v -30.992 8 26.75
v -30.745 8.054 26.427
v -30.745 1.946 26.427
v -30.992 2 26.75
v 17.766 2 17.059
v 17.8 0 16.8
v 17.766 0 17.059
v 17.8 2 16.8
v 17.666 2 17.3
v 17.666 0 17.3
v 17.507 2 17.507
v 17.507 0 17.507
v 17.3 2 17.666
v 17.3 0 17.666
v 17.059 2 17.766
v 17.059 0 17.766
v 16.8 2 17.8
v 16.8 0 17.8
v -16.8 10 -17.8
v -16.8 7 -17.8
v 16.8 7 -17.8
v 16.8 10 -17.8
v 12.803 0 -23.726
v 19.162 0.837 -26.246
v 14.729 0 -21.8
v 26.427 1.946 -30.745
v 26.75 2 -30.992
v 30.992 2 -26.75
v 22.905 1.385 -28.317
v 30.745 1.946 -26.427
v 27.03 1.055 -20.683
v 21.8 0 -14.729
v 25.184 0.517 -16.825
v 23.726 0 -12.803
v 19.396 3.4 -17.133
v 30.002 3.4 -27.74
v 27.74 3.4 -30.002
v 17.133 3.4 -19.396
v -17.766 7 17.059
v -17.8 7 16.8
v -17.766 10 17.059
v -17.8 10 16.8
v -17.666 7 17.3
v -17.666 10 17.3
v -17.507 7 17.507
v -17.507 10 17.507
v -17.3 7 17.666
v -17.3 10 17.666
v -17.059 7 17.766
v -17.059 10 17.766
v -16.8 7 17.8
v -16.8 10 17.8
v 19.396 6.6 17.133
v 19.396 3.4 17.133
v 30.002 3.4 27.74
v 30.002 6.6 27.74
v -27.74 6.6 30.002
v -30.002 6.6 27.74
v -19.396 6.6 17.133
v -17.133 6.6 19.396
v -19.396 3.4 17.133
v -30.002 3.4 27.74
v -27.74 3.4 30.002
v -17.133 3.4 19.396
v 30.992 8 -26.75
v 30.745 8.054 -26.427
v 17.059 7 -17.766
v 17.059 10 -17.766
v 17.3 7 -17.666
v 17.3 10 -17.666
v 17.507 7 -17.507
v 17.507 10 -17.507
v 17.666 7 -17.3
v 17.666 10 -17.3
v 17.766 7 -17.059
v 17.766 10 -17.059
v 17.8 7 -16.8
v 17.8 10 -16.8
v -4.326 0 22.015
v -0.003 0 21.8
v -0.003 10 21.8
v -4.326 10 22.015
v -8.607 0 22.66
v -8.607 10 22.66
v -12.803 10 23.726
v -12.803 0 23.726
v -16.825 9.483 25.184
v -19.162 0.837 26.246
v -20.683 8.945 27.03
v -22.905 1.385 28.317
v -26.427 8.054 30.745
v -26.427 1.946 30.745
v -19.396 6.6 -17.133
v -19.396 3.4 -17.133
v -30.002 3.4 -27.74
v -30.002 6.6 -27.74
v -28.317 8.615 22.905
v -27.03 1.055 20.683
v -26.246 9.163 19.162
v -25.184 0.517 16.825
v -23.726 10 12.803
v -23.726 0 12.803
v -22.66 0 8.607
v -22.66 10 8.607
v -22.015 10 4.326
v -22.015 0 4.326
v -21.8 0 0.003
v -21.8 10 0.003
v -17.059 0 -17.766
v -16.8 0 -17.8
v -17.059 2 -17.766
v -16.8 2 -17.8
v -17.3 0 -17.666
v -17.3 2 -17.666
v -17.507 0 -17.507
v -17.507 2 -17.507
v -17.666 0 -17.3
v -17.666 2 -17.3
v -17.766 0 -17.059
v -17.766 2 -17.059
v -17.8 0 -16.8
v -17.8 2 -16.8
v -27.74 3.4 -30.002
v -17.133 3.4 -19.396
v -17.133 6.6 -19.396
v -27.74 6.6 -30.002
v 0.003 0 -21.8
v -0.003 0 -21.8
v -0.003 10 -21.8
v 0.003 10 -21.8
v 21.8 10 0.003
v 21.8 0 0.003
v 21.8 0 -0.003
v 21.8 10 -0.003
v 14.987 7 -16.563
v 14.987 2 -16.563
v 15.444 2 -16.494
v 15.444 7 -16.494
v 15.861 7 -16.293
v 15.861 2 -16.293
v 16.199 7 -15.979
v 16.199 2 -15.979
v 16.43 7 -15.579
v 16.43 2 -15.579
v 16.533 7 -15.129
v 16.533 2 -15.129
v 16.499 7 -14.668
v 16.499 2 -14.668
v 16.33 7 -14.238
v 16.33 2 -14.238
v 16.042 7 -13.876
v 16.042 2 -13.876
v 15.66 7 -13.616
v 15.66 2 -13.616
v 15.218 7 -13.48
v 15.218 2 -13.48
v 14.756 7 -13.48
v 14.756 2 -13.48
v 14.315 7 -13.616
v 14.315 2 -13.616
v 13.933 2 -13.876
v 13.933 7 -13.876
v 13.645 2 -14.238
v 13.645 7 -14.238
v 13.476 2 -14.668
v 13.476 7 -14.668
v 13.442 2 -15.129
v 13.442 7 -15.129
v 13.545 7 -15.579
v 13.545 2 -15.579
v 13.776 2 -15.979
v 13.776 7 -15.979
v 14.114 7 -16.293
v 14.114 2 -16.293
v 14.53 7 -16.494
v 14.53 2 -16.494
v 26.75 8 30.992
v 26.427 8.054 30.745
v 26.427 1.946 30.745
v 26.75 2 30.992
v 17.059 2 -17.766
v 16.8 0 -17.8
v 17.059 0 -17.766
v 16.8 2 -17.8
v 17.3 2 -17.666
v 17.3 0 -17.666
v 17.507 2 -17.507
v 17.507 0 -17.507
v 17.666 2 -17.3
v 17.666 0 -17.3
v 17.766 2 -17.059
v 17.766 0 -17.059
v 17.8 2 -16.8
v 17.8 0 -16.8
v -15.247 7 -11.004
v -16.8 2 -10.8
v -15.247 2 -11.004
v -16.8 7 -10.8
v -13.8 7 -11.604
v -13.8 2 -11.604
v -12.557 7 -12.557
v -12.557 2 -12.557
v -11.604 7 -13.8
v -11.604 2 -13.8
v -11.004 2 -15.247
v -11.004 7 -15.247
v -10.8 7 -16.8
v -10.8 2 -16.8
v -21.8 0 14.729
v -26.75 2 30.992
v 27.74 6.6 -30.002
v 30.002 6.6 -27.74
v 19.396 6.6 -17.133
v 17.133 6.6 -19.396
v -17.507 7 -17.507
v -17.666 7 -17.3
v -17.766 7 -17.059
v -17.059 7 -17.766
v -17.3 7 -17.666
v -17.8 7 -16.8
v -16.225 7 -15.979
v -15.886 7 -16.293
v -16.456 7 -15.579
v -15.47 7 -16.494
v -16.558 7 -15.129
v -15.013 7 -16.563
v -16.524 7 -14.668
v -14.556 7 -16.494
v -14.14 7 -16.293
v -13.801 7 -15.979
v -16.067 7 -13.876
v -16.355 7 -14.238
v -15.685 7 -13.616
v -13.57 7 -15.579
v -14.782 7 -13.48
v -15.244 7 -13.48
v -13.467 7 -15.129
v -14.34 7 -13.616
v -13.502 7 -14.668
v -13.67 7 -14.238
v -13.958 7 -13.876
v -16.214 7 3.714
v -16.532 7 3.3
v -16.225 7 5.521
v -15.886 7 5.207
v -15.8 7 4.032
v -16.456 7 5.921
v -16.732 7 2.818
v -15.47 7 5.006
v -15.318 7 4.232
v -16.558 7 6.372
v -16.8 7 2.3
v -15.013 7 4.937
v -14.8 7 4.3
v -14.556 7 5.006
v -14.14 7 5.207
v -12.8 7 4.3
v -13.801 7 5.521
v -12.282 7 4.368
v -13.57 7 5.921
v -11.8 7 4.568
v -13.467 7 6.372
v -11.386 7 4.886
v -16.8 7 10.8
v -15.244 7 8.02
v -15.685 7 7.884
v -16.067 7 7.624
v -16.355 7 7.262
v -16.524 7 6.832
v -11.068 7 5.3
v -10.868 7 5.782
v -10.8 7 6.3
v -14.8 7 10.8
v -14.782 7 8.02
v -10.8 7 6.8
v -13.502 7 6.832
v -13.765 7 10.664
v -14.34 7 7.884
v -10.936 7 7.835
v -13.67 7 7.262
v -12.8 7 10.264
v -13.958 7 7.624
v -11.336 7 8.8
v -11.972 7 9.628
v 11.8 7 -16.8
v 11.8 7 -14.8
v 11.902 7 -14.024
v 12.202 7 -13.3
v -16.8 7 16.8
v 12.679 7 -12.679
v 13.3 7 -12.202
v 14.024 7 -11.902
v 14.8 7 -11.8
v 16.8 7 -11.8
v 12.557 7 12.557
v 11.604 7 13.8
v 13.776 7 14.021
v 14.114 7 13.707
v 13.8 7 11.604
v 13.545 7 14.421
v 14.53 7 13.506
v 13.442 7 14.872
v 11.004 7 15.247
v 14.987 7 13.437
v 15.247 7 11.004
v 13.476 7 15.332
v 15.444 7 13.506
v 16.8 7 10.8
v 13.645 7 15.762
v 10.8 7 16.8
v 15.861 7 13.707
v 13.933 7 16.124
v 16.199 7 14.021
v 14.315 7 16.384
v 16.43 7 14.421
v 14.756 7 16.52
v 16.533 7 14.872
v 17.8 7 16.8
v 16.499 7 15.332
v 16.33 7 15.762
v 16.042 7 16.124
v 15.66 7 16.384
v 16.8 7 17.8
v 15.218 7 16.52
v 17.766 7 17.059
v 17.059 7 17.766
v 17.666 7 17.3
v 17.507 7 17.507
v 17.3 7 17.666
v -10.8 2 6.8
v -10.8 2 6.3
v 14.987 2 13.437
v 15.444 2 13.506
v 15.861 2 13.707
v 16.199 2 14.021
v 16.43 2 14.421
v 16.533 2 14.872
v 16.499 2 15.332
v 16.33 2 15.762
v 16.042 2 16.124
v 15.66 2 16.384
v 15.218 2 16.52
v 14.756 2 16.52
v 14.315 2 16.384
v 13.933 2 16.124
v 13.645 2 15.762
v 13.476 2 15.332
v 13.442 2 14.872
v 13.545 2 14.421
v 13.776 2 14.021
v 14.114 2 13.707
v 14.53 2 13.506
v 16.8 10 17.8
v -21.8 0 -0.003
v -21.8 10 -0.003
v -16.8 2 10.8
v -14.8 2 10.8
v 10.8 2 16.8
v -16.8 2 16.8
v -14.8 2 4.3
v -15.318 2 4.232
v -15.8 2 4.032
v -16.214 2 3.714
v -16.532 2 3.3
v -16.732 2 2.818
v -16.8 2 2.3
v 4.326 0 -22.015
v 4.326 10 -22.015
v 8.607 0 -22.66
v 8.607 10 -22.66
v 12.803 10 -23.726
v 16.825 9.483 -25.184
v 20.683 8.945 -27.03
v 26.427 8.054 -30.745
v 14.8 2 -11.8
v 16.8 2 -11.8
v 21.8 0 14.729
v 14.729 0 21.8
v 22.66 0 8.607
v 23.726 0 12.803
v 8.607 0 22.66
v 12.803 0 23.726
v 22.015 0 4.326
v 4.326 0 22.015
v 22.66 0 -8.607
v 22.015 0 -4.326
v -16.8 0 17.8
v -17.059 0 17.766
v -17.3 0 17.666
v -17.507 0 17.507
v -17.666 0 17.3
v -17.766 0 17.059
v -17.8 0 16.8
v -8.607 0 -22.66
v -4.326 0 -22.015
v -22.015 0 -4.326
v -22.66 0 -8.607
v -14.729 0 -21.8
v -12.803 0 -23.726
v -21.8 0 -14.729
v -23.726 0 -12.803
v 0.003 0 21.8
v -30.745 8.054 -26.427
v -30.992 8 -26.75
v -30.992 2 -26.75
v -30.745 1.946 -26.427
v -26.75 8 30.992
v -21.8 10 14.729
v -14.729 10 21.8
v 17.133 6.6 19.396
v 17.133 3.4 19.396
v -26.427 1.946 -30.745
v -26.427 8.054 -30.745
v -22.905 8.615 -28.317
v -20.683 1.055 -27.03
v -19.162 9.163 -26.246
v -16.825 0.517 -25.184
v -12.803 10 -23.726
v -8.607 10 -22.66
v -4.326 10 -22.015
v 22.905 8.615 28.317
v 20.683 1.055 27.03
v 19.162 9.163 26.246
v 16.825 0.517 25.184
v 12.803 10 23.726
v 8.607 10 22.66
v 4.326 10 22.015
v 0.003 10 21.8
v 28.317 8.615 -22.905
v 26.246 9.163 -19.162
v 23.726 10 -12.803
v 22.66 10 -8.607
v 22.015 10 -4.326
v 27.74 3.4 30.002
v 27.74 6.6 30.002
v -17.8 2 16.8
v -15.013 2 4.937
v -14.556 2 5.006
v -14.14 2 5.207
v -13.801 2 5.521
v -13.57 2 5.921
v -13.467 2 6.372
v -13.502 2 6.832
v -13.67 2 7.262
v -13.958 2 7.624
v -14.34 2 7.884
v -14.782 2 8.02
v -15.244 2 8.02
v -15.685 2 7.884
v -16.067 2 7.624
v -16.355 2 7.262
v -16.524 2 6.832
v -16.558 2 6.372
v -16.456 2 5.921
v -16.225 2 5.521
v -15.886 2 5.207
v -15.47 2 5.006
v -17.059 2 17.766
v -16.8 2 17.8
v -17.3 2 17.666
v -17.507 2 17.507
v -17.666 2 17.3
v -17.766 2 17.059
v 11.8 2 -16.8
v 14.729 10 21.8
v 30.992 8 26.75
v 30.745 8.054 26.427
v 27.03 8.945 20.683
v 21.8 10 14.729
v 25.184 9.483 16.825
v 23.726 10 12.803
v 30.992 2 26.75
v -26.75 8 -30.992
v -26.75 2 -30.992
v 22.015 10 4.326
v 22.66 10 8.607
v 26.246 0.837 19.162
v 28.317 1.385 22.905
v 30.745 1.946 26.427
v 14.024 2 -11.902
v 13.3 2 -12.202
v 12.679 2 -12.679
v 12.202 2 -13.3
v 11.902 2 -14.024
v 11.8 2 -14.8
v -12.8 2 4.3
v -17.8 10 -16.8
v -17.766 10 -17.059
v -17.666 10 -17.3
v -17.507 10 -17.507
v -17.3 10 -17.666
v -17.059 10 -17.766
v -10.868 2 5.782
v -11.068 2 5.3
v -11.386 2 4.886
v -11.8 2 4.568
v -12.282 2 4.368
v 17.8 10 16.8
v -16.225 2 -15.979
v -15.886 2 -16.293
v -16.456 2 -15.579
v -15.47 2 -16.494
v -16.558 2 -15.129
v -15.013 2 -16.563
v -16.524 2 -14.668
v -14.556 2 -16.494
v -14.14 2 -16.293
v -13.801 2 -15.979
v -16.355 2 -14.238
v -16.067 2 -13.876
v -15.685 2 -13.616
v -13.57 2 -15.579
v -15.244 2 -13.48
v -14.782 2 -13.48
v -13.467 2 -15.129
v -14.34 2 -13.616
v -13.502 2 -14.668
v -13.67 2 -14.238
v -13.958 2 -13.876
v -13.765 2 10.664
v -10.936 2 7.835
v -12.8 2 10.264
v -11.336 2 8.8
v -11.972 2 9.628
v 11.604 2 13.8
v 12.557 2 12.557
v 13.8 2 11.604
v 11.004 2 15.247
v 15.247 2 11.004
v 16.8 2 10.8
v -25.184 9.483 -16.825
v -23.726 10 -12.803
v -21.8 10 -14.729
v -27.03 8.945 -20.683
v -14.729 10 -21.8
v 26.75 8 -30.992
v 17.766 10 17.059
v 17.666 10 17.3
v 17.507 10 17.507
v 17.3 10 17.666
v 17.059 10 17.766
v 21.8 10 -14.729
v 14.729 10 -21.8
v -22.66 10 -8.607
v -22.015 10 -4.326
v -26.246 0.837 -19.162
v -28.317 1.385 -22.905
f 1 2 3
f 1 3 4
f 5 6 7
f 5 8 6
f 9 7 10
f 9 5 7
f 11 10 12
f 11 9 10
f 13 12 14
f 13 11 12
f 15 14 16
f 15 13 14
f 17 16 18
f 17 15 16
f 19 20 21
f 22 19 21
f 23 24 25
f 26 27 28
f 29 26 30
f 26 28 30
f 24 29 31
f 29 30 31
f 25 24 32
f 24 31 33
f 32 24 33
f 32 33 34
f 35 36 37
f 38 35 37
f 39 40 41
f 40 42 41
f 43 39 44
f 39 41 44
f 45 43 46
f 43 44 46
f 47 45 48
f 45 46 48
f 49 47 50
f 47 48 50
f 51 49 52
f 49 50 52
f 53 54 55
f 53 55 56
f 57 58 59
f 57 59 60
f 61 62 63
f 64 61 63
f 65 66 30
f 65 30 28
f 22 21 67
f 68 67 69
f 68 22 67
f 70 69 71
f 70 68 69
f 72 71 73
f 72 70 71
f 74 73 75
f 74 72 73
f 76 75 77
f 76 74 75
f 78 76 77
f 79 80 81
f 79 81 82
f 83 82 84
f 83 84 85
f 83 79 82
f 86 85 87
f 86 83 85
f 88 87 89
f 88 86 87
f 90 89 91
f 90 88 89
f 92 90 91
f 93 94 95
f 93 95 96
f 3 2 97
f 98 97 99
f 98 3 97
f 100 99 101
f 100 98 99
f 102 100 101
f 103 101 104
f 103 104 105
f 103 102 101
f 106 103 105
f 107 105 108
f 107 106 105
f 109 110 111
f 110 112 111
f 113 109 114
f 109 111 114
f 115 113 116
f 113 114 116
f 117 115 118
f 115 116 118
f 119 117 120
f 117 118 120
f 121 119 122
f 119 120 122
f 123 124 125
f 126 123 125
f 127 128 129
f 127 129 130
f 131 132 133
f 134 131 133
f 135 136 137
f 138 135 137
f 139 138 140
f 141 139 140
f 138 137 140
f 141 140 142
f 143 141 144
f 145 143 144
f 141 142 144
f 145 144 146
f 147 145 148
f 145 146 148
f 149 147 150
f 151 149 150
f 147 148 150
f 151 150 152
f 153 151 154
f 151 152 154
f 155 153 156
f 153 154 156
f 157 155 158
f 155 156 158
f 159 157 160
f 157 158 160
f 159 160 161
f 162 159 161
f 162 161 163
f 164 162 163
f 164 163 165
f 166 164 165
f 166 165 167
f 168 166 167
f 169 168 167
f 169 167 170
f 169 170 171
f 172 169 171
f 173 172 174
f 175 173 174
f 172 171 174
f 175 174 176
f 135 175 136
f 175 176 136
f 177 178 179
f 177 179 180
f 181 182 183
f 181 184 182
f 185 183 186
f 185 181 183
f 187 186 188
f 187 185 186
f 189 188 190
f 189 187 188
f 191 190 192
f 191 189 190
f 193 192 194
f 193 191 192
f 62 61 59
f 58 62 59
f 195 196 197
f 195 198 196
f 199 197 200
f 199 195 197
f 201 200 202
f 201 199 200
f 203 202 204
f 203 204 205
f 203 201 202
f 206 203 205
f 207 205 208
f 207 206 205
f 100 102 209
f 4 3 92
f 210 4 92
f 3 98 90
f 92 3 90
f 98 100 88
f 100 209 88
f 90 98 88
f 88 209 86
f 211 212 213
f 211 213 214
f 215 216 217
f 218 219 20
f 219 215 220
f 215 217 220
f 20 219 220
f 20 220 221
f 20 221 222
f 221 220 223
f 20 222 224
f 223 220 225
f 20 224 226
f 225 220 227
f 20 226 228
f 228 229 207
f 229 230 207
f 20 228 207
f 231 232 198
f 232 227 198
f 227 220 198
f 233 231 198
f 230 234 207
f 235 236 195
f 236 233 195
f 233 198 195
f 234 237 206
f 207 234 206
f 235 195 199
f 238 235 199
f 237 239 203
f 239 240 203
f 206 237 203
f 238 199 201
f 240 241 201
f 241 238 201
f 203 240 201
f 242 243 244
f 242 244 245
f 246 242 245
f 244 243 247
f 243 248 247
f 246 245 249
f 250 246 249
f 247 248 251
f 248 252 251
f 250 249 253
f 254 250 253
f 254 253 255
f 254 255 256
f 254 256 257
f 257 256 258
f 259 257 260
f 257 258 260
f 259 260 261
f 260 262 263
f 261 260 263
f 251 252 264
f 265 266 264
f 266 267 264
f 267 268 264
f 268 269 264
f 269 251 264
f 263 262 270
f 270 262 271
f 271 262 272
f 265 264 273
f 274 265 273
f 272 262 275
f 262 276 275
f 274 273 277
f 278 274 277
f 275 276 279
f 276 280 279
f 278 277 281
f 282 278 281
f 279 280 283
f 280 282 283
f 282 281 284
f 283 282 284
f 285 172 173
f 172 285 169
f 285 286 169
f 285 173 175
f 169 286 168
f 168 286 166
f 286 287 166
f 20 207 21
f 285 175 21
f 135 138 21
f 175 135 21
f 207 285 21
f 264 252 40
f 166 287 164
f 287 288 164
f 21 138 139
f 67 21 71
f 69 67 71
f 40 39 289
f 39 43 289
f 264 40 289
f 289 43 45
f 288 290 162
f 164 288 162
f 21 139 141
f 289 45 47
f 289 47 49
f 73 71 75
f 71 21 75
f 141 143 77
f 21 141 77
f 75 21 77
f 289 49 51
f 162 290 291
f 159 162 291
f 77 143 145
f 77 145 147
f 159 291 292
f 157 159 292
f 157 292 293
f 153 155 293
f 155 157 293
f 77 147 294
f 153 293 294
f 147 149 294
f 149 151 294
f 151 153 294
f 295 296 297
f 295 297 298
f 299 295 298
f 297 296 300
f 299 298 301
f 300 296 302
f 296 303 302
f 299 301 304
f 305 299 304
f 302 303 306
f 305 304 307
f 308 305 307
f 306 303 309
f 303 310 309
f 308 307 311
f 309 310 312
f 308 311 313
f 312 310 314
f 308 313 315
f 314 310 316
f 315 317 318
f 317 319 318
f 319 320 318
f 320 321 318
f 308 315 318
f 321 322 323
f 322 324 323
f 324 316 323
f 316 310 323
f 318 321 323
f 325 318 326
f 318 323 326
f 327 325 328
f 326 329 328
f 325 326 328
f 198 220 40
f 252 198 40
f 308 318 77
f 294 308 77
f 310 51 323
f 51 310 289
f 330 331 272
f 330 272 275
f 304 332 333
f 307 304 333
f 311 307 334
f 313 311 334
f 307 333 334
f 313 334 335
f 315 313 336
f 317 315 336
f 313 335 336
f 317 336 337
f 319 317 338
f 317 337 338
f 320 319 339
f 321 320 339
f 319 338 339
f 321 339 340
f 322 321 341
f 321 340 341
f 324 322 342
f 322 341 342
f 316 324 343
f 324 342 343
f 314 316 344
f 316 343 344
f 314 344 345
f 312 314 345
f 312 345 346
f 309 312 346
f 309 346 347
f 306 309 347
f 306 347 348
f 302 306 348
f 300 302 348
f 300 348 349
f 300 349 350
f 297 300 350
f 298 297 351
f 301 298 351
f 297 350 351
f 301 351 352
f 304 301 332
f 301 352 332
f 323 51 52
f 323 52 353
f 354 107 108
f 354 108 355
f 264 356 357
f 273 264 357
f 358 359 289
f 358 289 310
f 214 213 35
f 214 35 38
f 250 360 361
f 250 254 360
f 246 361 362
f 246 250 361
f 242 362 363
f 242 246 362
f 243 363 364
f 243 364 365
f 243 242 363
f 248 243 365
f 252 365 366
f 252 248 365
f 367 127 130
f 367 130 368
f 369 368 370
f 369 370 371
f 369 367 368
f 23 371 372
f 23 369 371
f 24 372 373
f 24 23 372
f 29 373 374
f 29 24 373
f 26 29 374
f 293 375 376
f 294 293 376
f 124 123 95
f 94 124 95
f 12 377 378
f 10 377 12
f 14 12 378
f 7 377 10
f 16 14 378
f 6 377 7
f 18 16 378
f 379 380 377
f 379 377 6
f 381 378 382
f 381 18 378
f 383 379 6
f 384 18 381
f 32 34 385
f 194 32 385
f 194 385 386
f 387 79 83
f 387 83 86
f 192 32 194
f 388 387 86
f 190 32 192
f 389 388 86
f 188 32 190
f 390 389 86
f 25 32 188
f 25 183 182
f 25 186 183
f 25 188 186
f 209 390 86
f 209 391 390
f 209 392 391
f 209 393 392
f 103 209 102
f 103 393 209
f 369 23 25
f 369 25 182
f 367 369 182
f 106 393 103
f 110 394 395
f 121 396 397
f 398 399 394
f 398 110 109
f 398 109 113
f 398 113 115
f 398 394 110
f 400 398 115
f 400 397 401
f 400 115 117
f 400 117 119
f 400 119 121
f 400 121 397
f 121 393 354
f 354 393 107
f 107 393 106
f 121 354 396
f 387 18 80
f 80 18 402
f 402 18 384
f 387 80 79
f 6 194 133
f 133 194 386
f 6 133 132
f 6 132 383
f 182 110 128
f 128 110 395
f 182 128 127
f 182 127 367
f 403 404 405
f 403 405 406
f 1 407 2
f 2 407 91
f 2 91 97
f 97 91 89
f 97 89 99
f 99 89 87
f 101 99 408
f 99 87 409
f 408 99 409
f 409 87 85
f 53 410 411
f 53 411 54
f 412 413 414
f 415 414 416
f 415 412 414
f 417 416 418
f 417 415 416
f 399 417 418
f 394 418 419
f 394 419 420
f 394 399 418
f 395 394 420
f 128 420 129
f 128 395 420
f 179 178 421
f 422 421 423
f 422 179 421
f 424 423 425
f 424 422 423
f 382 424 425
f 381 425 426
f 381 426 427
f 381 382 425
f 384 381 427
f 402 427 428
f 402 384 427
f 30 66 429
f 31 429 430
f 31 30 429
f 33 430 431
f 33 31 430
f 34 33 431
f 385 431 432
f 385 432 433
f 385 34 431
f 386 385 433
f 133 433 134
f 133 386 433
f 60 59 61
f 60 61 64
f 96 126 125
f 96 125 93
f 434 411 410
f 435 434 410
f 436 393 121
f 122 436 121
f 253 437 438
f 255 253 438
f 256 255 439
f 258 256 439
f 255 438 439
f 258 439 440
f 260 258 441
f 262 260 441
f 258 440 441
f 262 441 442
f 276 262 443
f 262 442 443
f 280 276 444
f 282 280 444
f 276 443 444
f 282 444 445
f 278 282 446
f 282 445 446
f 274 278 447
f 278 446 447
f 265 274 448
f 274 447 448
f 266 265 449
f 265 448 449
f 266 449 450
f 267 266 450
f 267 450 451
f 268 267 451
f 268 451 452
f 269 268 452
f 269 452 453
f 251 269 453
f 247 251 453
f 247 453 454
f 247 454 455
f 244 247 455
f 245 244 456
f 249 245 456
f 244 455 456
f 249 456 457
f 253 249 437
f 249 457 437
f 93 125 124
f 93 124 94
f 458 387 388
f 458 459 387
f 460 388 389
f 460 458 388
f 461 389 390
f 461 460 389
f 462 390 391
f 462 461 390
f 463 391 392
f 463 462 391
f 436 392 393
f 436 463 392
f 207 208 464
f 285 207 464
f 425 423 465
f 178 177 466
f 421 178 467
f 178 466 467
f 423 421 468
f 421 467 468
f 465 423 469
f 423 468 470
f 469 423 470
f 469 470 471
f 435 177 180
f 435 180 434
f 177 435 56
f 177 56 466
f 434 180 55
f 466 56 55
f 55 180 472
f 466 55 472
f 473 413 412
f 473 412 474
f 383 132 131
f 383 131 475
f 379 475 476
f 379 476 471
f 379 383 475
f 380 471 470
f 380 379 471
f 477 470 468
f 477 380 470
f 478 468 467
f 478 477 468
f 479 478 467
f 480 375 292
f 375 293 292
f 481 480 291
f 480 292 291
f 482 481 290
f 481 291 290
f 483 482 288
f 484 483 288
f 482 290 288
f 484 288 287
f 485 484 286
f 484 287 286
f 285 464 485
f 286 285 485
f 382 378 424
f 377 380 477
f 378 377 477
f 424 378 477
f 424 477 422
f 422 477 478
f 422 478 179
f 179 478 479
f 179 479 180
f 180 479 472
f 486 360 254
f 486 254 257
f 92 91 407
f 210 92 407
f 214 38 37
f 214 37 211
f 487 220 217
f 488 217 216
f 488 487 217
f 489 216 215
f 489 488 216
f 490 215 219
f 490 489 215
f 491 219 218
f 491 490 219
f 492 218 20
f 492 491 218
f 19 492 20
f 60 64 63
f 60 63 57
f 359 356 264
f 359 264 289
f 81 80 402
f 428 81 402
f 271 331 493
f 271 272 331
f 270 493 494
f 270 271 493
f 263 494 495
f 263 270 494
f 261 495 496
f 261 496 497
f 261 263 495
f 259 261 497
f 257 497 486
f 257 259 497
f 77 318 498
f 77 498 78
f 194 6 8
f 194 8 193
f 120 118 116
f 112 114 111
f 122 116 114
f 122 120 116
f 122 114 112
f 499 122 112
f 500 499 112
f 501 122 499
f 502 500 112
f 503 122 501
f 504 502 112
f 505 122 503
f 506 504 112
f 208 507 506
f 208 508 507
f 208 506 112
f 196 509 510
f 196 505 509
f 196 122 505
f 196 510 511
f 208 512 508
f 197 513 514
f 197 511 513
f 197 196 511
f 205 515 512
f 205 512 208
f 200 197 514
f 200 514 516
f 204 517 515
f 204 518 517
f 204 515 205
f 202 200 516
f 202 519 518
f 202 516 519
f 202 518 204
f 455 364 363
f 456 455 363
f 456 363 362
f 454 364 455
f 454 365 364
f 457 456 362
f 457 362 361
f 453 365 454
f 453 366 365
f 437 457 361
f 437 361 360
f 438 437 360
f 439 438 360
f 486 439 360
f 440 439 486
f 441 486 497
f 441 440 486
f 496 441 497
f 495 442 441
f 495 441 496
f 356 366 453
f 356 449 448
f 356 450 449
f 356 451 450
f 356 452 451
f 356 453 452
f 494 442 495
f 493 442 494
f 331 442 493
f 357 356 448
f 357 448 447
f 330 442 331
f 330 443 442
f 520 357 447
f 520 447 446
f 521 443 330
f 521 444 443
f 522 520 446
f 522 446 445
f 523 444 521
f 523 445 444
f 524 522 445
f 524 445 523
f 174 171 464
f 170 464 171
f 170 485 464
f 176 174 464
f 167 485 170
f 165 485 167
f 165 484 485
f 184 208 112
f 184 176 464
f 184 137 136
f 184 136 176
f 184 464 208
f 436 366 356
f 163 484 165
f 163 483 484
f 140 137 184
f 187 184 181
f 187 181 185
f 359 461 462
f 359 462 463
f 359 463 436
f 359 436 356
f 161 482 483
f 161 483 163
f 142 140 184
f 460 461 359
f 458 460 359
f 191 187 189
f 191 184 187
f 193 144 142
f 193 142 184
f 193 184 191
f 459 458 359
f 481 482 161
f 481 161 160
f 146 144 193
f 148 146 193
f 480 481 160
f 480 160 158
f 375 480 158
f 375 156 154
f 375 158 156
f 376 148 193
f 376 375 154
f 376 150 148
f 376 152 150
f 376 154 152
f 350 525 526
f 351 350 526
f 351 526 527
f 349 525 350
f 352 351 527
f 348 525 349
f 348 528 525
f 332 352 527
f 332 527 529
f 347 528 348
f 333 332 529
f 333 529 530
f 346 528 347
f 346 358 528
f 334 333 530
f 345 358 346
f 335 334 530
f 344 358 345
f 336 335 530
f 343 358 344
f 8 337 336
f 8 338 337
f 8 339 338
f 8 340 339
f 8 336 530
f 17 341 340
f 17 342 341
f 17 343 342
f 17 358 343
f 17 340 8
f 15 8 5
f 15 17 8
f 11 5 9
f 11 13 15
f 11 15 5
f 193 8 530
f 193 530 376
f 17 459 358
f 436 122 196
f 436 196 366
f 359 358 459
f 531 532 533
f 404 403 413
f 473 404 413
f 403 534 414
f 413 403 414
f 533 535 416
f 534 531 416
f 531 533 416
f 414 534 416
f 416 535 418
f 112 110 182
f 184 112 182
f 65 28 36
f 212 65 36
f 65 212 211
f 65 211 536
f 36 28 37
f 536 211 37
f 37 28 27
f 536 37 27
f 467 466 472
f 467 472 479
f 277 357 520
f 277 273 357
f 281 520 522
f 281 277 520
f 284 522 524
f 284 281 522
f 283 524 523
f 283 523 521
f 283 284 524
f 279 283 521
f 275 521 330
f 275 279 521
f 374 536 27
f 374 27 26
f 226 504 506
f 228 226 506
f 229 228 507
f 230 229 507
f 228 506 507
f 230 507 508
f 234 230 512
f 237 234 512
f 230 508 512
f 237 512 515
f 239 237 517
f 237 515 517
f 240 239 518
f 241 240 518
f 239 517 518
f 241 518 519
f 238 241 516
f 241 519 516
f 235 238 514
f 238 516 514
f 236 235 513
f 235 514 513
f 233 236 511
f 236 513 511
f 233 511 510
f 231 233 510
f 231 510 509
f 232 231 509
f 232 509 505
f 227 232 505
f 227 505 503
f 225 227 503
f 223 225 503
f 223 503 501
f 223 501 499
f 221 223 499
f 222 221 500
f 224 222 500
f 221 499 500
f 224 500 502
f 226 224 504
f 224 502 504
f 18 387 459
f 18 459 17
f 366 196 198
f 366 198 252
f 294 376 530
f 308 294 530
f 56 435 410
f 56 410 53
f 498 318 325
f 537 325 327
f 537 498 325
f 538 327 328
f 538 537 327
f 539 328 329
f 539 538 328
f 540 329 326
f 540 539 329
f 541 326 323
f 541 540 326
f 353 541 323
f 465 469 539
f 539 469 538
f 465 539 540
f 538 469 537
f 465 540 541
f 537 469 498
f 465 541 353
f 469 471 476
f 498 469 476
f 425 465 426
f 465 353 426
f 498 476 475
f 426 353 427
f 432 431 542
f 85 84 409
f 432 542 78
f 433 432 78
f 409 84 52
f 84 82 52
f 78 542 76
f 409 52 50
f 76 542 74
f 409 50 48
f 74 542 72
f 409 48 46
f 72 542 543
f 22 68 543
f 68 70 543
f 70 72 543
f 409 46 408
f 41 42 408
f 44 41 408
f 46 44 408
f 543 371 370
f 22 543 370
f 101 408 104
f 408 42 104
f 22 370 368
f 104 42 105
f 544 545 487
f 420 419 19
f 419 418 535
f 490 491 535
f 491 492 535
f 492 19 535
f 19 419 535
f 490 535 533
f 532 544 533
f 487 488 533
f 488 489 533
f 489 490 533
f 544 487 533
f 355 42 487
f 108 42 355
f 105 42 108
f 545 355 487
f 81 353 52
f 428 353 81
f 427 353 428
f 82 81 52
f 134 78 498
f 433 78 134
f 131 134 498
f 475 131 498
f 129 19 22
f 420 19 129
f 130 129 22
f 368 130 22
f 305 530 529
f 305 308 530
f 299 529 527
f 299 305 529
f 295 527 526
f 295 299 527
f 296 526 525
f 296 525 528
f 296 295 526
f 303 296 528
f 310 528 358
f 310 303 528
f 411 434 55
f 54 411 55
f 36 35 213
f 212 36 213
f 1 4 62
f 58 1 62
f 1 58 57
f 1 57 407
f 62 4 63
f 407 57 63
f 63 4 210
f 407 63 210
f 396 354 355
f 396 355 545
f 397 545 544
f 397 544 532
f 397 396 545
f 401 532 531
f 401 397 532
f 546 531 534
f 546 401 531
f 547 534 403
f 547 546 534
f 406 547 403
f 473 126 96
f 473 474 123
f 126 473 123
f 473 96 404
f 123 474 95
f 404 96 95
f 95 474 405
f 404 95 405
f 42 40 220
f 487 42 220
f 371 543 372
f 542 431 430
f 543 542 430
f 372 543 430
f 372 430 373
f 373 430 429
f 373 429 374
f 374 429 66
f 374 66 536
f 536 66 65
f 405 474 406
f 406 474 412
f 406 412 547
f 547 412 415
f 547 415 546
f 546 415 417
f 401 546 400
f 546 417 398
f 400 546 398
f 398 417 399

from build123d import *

# Parameters (mm, degrees)
ESQUISSE1_W                   = 43.6
ESQUISSE1_H                   = 43.6
ESQUISSE1_W_2                 = 35.6
ESQUISSE1_H_2                 = 35.6
BOSS_EXTRU_1_DEPTH            = 10
ESQUISSE2_W                   = 3.2
ESQUISSE2_H                   = 3.2
ENL_V_MAT_EXTRU_1_DEPTH       = 15
CHANFREIN1_SIZE               = 15
CHANFREIN1_SIZE_2             = 2
R_P_TITION_CIRCULAIRE10_COUNT = 4
BOSS_EXTRU_3_START            = -2
ESQUISSE6_W                   = 6
ESQUISSE6_H                   = 6.5
ESQUISSE6_R                   = 1.55
ESQUISSE6_H_2                 = 6
ESQUISSE6_W_2                 = 5
ESQUISSE6_H_3                 = 5
ESQUISSE6_W_3                 = 1
ESQUISSE6_H_4                 = 22.6
ESQUISSE6_H_5                 = 15.1
ESQUISSE6_W_4                 = 22.6
ESQUISSE6_H_6                 = 1
BOSS_EXTRU_3_DEPTH            = 5
CONG_1_R                      = 6
CONG_2_R                      = 3
CONG_3_R                      = 4
CONG_4_R                      = 2
CONG_8_R                      = 1
CONG_9_R                      = 43.5
CONG_10_R                     = 2


# Some blends are built 0.0001 mm under size
with BuildPart() as part:
    # Esquisse1 → Boss.-Extru.1 (new body)
    # profile 1 of 5: a face of its own
    with BuildSketch(Plane(origin=(0, 0, 0), x_dir=(1, 0, 0), z_dir=(0, 1, 0))):
        Rectangle(ESQUISSE1_W, ESQUISSE1_H)
        Rectangle(ESQUISSE1_W_2, ESQUISSE1_H_2, mode=Mode.SUBTRACT)
    # profile 2 of 5: a face of its own
    with BuildSketch(Plane(origin=(0, 0, 0), x_dir=(1, 0, 0), z_dir=(0, 1, 0))):
        Polygon((32.406601718, -25.335533906), (21.8, -14.728932188), (21.8, -21.8), (14.728932188, -21.8), (25.335533906, -32.406601718), align=None)
    # profile 3 of 5: a face of its own
    with BuildSketch(Plane(origin=(0, 0, 0), x_dir=(1, 0, 0), z_dir=(0, 1, 0))):
        Polygon((21.8, 21.8), (21.8, 14.728932188), (32.406601718, 25.335533906), (25.335533906, 32.406601718), (14.728932188, 21.8), align=None)
    # profile 4 of 5: a face of its own
    with BuildSketch(Plane(origin=(0, 0, 0), x_dir=(1, 0, 0), z_dir=(0, 1, 0))):
        Polygon((-21.8, 21.8), (-14.728932188, 21.8), (-25.335533906, 32.406601718), (-32.406601718, 25.335533906), (-21.8, 14.728932188), align=None)
    # profile 5 of 5: a face of its own
    with BuildSketch(Plane(origin=(0, 0, 0), x_dir=(1, 0, 0), z_dir=(0, 1, 0))):
        Polygon((-25.335533906, -32.406601718), (-14.728932188, -21.8), (-21.8, -21.8), (-21.8, -14.728932188), (-32.406601718, -25.335533906), align=None)
    extrude(amount=BOSS_EXTRU_1_DEPTH)

    # Esquisse2 → Enlèv. mat.-Extru.1 (cut)
    with BuildSketch(Plane(origin=(28.871067812, 0, 28.871067812), x_dir=(0.7071067811865475, 0, -0.7071067811865477), z_dir=(0.7071067811865477, 0, 0.7071067811865475))):
        with Locations((0, 5)):
            Rectangle(ESQUISSE2_W, ESQUISSE2_H)
    enl_v_mat_extru_1 = extrude(amount=-ENL_V_MAT_EXTRU_1_DEPTH, mode=Mode.SUBTRACT)

    # Chanfrein1
    # the kernel refuses this chamfer: 15, 2 mm, written as the material it takes off along each edge
    with BuildSketch(Plane(origin=(-2.232682747, 0, 59.974818371), x_dir=(-0.7070976396858032, -0.0050848698637449155, -0.7070976396858037), z_dir=(0.7071067811865478, 0, -0.7071067811865474)), Plane(origin=(59.974818371, 0, 2.232682747), x_dir=(-0.7070976396858033, -0.005084869863744911, 0.7070976396858037), z_dir=(-0.7071067811865477, 0, -0.7071067811865474)), Plane(origin=(2.232682747, 0, -59.974818371), x_dir=(0.7070976396858034, -0.005084869863744912, 0.7070976396858035), z_dir=(-0.7071067811865476, 0, 0.7071067811865476)), Plane(origin=(-59.974818371, 0, -2.232682747), x_dir=(0.7070976396858035, -0.005084869863744911, -0.7070976396858034), z_dir=(0.7071067811865476, 0, 0.7071067811865476))) as chanfrein1_piece_1:
        Polygon((CHANFREIN1_SIZE * 0.999987071966, CHANFREIN1_SIZE * 0.00508486986374), (-CHANFREIN1_SIZE_2 * 0.00508486986374, CHANFREIN1_SIZE_2 * 0.999987071966), (0, 0), align=None)
    extrude(amount=87.974691762, mode=Mode.SUBTRACT)
    with BuildSketch(Plane(origin=(-2.232682747, 10, 59.974818371), x_dir=(-0.7070976396858032, 0.005084869863744968, -0.7070976396858037), z_dir=(0.7071067811865478, 0, -0.7071067811865474)), Plane(origin=(59.974818371, 10, 2.232682747), x_dir=(-0.7070976396858033, 0.005084869863744967, 0.7070976396858037), z_dir=(-0.7071067811865477, 0, -0.7071067811865474)), Plane(origin=(2.232682747, 10, -59.974818371), x_dir=(0.7070976396858034, 0.005084869863744967, 0.7070976396858035), z_dir=(-0.7071067811865476, 0, 0.7071067811865476)), Plane(origin=(-59.974818371, 10, -2.232682747), x_dir=(0.7070976396858035, 0.005084869863744967, -0.7070976396858034), z_dir=(0.7071067811865476, 0, 0.7071067811865476))) as chanfrein1_piece_2:
        Polygon((CHANFREIN1_SIZE * 0.999987071966, -CHANFREIN1_SIZE * 0.00508486986374), (-CHANFREIN1_SIZE_2 * 0.00508486986374, -CHANFREIN1_SIZE_2 * 0.999987071966), (0, 0), align=None)
    extrude(amount=87.974691762, mode=Mode.SUBTRACT)
    with BuildSketch(Plane(origin=(25.335533906, -38.987345881, 32.406601718), x_dir=(-0.7106931856479084, 0, -0.7035020937236985), z_dir=(0, 1, 0))) as chanfrein1_piece_3_section:
        Polygon((CHANFREIN1_SIZE * 0.999987071966, -CHANFREIN1_SIZE * 0.00508486986374), (-CHANFREIN1_SIZE_2 * 0.00508486986374, -CHANFREIN1_SIZE_2 * 0.999987071966), (0, 0), align=None)
    chanfrein1_piece_3 = extrude(amount=87.974691762, mode=Mode.PRIVATE)
    chanfrein1_piece_3 = split(chanfrein1_piece_3, bisect_by=Plane(origin=(21.834036331, 5, 21.8), z_dir=(0, 0, 1)), keep=Keep.TOP, mode=Mode.PRIVATE)
    add(chanfrein1_piece_3, mode=Mode.SUBTRACT)
    with BuildSketch(Plane(origin=(32.406601718, -38.987345881, 25.335533906), x_dir=(-0.48538969413478916, 0, 0.8742979153742365), z_dir=(0, 1, 0))) as chanfrein1_piece_4_section:
        Polygon((CHANFREIN1_SIZE_2 * 0.961444328979, -CHANFREIN1_SIZE_2 * 0.274999640498), (-CHANFREIN1_SIZE * 0.274999640498, -CHANFREIN1_SIZE * 0.961444328979), (0, 0), align=None)
    chanfrein1_piece_4 = extrude(amount=87.974691762, mode=Mode.PRIVATE)
    chanfrein1_piece_4 = split(chanfrein1_piece_4, bisect_by=Plane(origin=(21.8, 5, 21.834036331), z_dir=(1, 0, 0)), keep=Keep.TOP, mode=Mode.PRIVATE)
    add(chanfrein1_piece_4, mode=Mode.SUBTRACT)
    with BuildSketch(Plane(origin=(32.406601718, -38.987345881, -25.335533906), x_dir=(-0.7035020937236987, 0, 0.7106931856479084), z_dir=(0, 1, 0))) as chanfrein1_piece_5_section:
        Polygon((CHANFREIN1_SIZE * 0.999987071966, -CHANFREIN1_SIZE * 0.00508486986374), (-CHANFREIN1_SIZE_2 * 0.00508486986374, -CHANFREIN1_SIZE_2 * 0.999987071966), (0, 0), align=None)
    chanfrein1_piece_5 = extrude(amount=87.974691762, mode=Mode.PRIVATE)
    chanfrein1_piece_5 = split(chanfrein1_piece_5, bisect_by=Plane(origin=(21.8, 5, -21.834036331), z_dir=(1, 0, 0)), keep=Keep.TOP, mode=Mode.PRIVATE)
    add(chanfrein1_piece_5, mode=Mode.SUBTRACT)
    with BuildSketch(Plane(origin=(25.335533906, -38.987345881, -32.406601718), x_dir=(0.874297915374238, 0, 0.48538969413478666), z_dir=(0, 1, 0))) as chanfrein1_piece_6_section:
        Polygon((CHANFREIN1_SIZE_2 * 0.961444328979, -CHANFREIN1_SIZE_2 * 0.274999640498), (-CHANFREIN1_SIZE * 0.274999640498, -CHANFREIN1_SIZE * 0.961444328979), (0, 0), align=None)
    chanfrein1_piece_6 = extrude(amount=87.974691762, mode=Mode.PRIVATE)
    chanfrein1_piece_6 = split(chanfrein1_piece_6, bisect_by=Plane(origin=(21.834036331, 5, -21.8), z_dir=(0, 0, -1)), keep=Keep.TOP, mode=Mode.PRIVATE)
    add(chanfrein1_piece_6, mode=Mode.SUBTRACT)
    with BuildSketch(Plane(origin=(-25.335533906, -38.987345881, -32.406601718), x_dir=(0.7106931856479084, 0, 0.7035020937236987), z_dir=(0, 1, 0))) as chanfrein1_piece_7_section:
        Polygon((CHANFREIN1_SIZE * 0.999987071966, -CHANFREIN1_SIZE * 0.00508486986375), (-CHANFREIN1_SIZE_2 * 0.00508486986374, -CHANFREIN1_SIZE_2 * 0.999987071966), (0, 0), align=None)
    chanfrein1_piece_7 = extrude(amount=87.974691762, mode=Mode.PRIVATE)
    chanfrein1_piece_7 = split(chanfrein1_piece_7, bisect_by=Plane(origin=(-21.834036331, 5, -21.8), z_dir=(0, 0, -1)), keep=Keep.TOP, mode=Mode.PRIVATE)
    add(chanfrein1_piece_7, mode=Mode.SUBTRACT)
    with BuildSketch(Plane(origin=(-32.406601718, -38.987345881, -25.335533906), x_dir=(0.48538969413478794, 0, -0.8742979153742373), z_dir=(0, 1, 0))) as chanfrein1_piece_8_section:
        Polygon((CHANFREIN1_SIZE_2 * 0.961444328979, -CHANFREIN1_SIZE_2 * 0.274999640498), (-CHANFREIN1_SIZE * 0.274999640498, -CHANFREIN1_SIZE * 0.961444328979), (0, 0), align=None)
    chanfrein1_piece_8 = extrude(amount=87.974691762, mode=Mode.PRIVATE)
    chanfrein1_piece_8 = split(chanfrein1_piece_8, bisect_by=Plane(origin=(-21.8, 5, -21.834036331), z_dir=(-1, 0, 0)), keep=Keep.TOP, mode=Mode.PRIVATE)
    add(chanfrein1_piece_8, mode=Mode.SUBTRACT)
    with BuildSketch(Plane(origin=(-32.406601718, -38.987345881, 25.335533906), x_dir=(0.7035020937236987, 0, -0.7106931856479084), z_dir=(0, 1, 0))) as chanfrein1_piece_9_section:
        Polygon((CHANFREIN1_SIZE * 0.999987071966, -CHANFREIN1_SIZE * 0.00508486986374), (-CHANFREIN1_SIZE_2 * 0.00508486986374, -CHANFREIN1_SIZE_2 * 0.999987071966), (0, 0), align=None)
    chanfrein1_piece_9 = extrude(amount=87.974691762, mode=Mode.PRIVATE)
    chanfrein1_piece_9 = split(chanfrein1_piece_9, bisect_by=Plane(origin=(-21.8, 5, 21.834036331), z_dir=(-1, 0, 0)), keep=Keep.TOP, mode=Mode.PRIVATE)
    add(chanfrein1_piece_9, mode=Mode.SUBTRACT)
    with BuildSketch(Plane(origin=(-25.335533906, -38.987345881, 32.406601718), x_dir=(0.7106931856479087, 0, -0.7035020937236982), z_dir=(0, 1, 0))) as chanfrein1_piece_10_section:
        Polygon((CHANFREIN1_SIZE * 0.999987071966, CHANFREIN1_SIZE * 0.00508486986374), (-CHANFREIN1_SIZE_2 * 0.00508486986375, CHANFREIN1_SIZE_2 * 0.999987071966), (0, 0), align=None)
    chanfrein1_piece_10 = extrude(amount=87.974691762, mode=Mode.PRIVATE)
    chanfrein1_piece_10 = split(chanfrein1_piece_10, bisect_by=Plane(origin=(-21.834036331, 5, 21.8), z_dir=(0, 0, 1)), keep=Keep.TOP, mode=Mode.PRIVATE)
    add(chanfrein1_piece_10, mode=Mode.SUBTRACT)

    # Répétition circulaire10: Enlèv. mat.-Extru.1 ×4 about axis
    r_p_tition_circulaire10_axis = Axis((0, 0, 0), (0, 1, 0))
    for i in range(1, R_P_TITION_CIRCULAIRE10_COUNT):
        add(enl_v_mat_extru_1.rotate(r_p_tition_circulaire10_axis, i * 360 / R_P_TITION_CIRCULAIRE10_COUNT), mode=Mode.SUBTRACT)

    # Esquisse6 → Boss.-Extru.3 (add)
    # profile 1 of 12: a face of its own
    with BuildSketch(Plane.XZ.offset(BOSS_EXTRU_3_START)):
        with Locations((-13.8, 7.55)):
            Rectangle(ESQUISSE6_W, ESQUISSE6_H)
        with Locations(Location((-15.012694945, 6.487348235, 0), (0, 0, 270))):
            Circle(ESQUISSE6_R, mode=Mode.SUBTRACT)
    # profile 2 of 12: a face of its own
    with BuildSketch(Plane.XZ.offset(BOSS_EXTRU_3_START)):
        with Locations((-13.8, -13.8)):
            Rectangle(ESQUISSE6_W, ESQUISSE6_H_2)
        with Locations(Location((-15.012694945, -15.012694945, 0), (0, 0, 270))):
            Circle(ESQUISSE6_R, mode=Mode.SUBTRACT)
    # profile 3 of 12: a face of its own
    with BuildSketch(Plane.XZ.offset(BOSS_EXTRU_3_START)):
        with Locations((14.3, -14.3)):
            Rectangle(ESQUISSE6_W_2, ESQUISSE6_H_3)
        with Locations(Location((14.987366015, -15.012694945, 0), (0, 0, 270))):
            Circle(ESQUISSE6_R, mode=Mode.SUBTRACT)
    # profile 4 of 12: a face of its own
    with BuildSketch(Plane.XZ.offset(BOSS_EXTRU_3_START)):
        Polygon((17.8, -17.8), (17.8, -11.8), (16.8, -11.8), (16.8, -16.8), (11.8, -16.8), (11.8, -17.8), align=None)
    # profile 5 of 12: a face of its own
    with BuildSketch(Plane.XZ.offset(BOSS_EXTRU_3_START)):
        Polygon((-16.8, -10.8), (-17.8, -10.8), (-17.8, -17.8), (-10.8, -17.8), (-10.8, -16.8), (-16.8, -16.8), align=None)
    # profile 6 of 12: a face of its own
    with BuildSketch(Plane.XZ.offset(BOSS_EXTRU_3_START)):
        with Locations((-17.3, 7.55)):
            Rectangle(ESQUISSE6_W_3, ESQUISSE6_H)
    # profile 7 of 12: a face of its own
    with BuildSketch(Plane.XZ.offset(BOSS_EXTRU_3_START)):
        Polygon((17.8, 10.8), (17.8, 17.8), (10.8, 17.8), (10.8, 16.8), (16.8, 16.8), (16.8, 10.8), align=None)
    # profile 8 of 12: a face of its own
    with BuildSketch(Plane.XZ.offset(BOSS_EXTRU_3_START)):
        with Locations((17.3, -0.5)):
            Rectangle(ESQUISSE6_W_3, ESQUISSE6_H_4)
    # profile 9 of 12: a face of its own
    with BuildSketch(Plane.XZ.offset(BOSS_EXTRU_3_START)):
        Polygon((10.8, 16.8), (10.8, 17.8), (-17.8, 17.8), (-17.8, 10.8), (-16.8, 10.8), (-16.8, 16.8), align=None)
    # profile 10 of 12: a face of its own
    with BuildSketch(Plane.XZ.offset(BOSS_EXTRU_3_START)):
        with Locations((-17.3, -3.25)):
            Rectangle(ESQUISSE6_W_3, ESQUISSE6_H_5)
    # profile 11 of 12: a face of its own
    with BuildSketch(Plane.XZ.offset(BOSS_EXTRU_3_START)):
        with Locations((0.5, -17.3)):
            Rectangle(ESQUISSE6_W_4, ESQUISSE6_H_6)
    # profile 12 of 12: a face of its own
    with BuildSketch(Plane.XZ.offset(BOSS_EXTRU_3_START)):
        with Locations((13.8, 13.8)):
            Rectangle(ESQUISSE6_W, ESQUISSE6_H_2)
        with Locations(Location((14.987366015, 14.987366015, 0), (0, 0, 270))):
            Circle(ESQUISSE6_R, mode=Mode.SUBTRACT)
    extrude(amount=-BOSS_EXTRU_3_DEPTH)

    # Congé1
    cong_1_edges = [part.edges().sort_by_distance(p)[0] for p in [
        (-10.8, 4.5, -10.8),
        (10.8, 4.5, 10.8),
    ]]
    fillet(cong_1_edges, radius=CONG_1_R - 0.0001)  # a hair under: the kernel refuses the full size

    # Congé2
    cong_2_edges = [part.edges().sort_by_distance(p)[0] for p in [
        (11.8, 4.5, -11.8),
    ]]
    fillet(cong_2_edges, radius=CONG_2_R)

    # Congé3
    cong_3_edges = [part.edges().sort_by_distance(p)[0] for p in [
        (-10.8, 4.5, 10.8),
    ]]
    fillet(cong_3_edges, radius=CONG_3_R)

    # Congé4
    cong_4_edges = [part.edges().sort_by_distance(p)[0] for p in [
        (-10.8, 4.5, 4.3),
    ]]
    fillet(cong_4_edges, radius=CONG_4_R)

    # Congé8
    cong_8_edges = [part.edges().sort_by_distance(p)[0] for p in [
        (17.8, 1, -17.8),
        (-17.8, 1, -17.8),
        (-17.8, 1, 17.8),
        (17.8, 1, 17.8),
        (17.8, 8.5, -17.8),
        (-17.8, 8.5, -17.8),
        (-17.8, 8.5, 17.8),
        (17.8, 8.5, 17.8),
    ]]
    fillet(cong_8_edges, radius=CONG_8_R)

    # Congé9
    # the kernel refuses this fillet: 43.5 mm, written as the material it adds along each edge
    with BuildSketch(Plane(origin=(-21.8, 0, 14.728932188), x_dir=(0, 0, -1), z_dir=(0, 1, 0))) as cong_9_piece_1_section:
        with BuildLine():
            CenterArc((CONG_9_R * 0.338533427618, CONG_9_R), CONG_9_R, 232.594643369, 37.405356631)
            Line((-CONG_9_R * 0.268916679953, CONG_9_R * 0.205642167023), (0, 0))
            Line((0, 0), (CONG_9_R * 0.338533427618, 0))
        make_face()
    cong_9_piece_1 = extrude(amount=10, mode=Mode.PRIVATE)
    cong_9_piece_1 = split(cong_9_piece_1, bisect_by=Plane(origin=(-23.815811659, 0.117652919, 13.961018177), z_dir=(0.09345386270338202, 0.9912279006826004, -0.09345386270338202)), keep=Keep.TOP, mode=Mode.PRIVATE)
    cong_9_piece_1 = split(cong_9_piece_1, bisect_by=Plane(origin=(-23.815811659, 9.882347081, 13.961018177), z_dir=(0.09345386270338202, -0.9912279006826004, -0.09345386270338202)), keep=Keep.TOP, mode=Mode.PRIVATE)
    add(cong_9_piece_1)
    with BuildSketch(Plane(origin=(-21.8, 0, -14.728932188), x_dir=(0, 0, 1), z_dir=(0, 1, 0))) as cong_9_piece_2_section:
        with BuildLine():
            CenterArc((CONG_9_R * 0.338533427618, -CONG_9_R), CONG_9_R, 90, 37.405356631)
            Line((-CONG_9_R * 0.268916679952, -CONG_9_R * 0.205642167022), (0, 0))
            Line((0, 0), (CONG_9_R * 0.338533427618, 0))
        make_face()
    cong_9_piece_2 = extrude(amount=10, mode=Mode.PRIVATE)
    cong_9_piece_2 = split(cong_9_piece_2, bisect_by=Plane(origin=(-23.815811659, 0.117652919, -13.961018177), z_dir=(0.09345386270338202, 0.9912279006826004, 0.09345386270338202)), keep=Keep.TOP, mode=Mode.PRIVATE)
    cong_9_piece_2 = split(cong_9_piece_2, bisect_by=Plane(origin=(-23.815811659, 9.882347081, -13.961018177), z_dir=(0.09345386270338202, -0.9912279006826004, 0.09345386270338202)), keep=Keep.TOP, mode=Mode.PRIVATE)
    add(cong_9_piece_2)
    with BuildSketch(Plane(origin=(-14.728932188, 0, -21.8), x_dir=(1, 0, 0), z_dir=(0, 1, 0))) as cong_9_piece_3_section:
        with BuildLine():
            CenterArc((CONG_9_R * 0.338533427618, CONG_9_R), CONG_9_R, 232.594643369, 37.405356631)
            Line((-CONG_9_R * 0.268916679953, CONG_9_R * 0.205642167023), (0, 0))
            Line((0, 0), (CONG_9_R * 0.338533427618, 0))
        make_face()
    cong_9_piece_3 = extrude(amount=10, mode=Mode.PRIVATE)
    cong_9_piece_3 = split(cong_9_piece_3, bisect_by=Plane(origin=(-13.961018177, 0.117652919, -23.815811659), z_dir=(0.09345386270338202, 0.9912279006826004, 0.09345386270338202)), keep=Keep.TOP, mode=Mode.PRIVATE)
    cong_9_piece_3 = split(cong_9_piece_3, bisect_by=Plane(origin=(-13.961018177, 9.882347081, -23.815811659), z_dir=(0.09345386270338202, -0.9912279006826004, 0.09345386270338202)), keep=Keep.TOP, mode=Mode.PRIVATE)
    add(cong_9_piece_3)
    with BuildSketch(Plane(origin=(14.728932188, 0, -21.8), x_dir=(-1, 0, 0), z_dir=(0, 1, 0))) as cong_9_piece_4_section:
        with BuildLine():
            CenterArc((CONG_9_R * 0.338533427618, -CONG_9_R), CONG_9_R, 90, 37.405356631)
            Line((-CONG_9_R * 0.268916679952, -CONG_9_R * 0.205642167022), (0, 0))
            Line((0, 0), (CONG_9_R * 0.338533427618, 0))
        make_face()
    cong_9_piece_4 = extrude(amount=10, mode=Mode.PRIVATE)
    cong_9_piece_4 = split(cong_9_piece_4, bisect_by=Plane(origin=(13.961018177, 0.117652919, -23.815811659), z_dir=(-0.09345386270338202, 0.9912279006826004, 0.09345386270338202)), keep=Keep.TOP, mode=Mode.PRIVATE)
    cong_9_piece_4 = split(cong_9_piece_4, bisect_by=Plane(origin=(13.961018177, 9.882347081, -23.815811659), z_dir=(-0.09345386270338202, -0.9912279006826004, 0.09345386270338202)), keep=Keep.TOP, mode=Mode.PRIVATE)
    add(cong_9_piece_4)
    with BuildSketch(Plane(origin=(21.8, 0, -14.728932188), x_dir=(0, 0, 1), z_dir=(0, 1, 0))) as cong_9_piece_5_section:
        with BuildLine():
            CenterArc((CONG_9_R * 0.338533427618, CONG_9_R), CONG_9_R, 232.594643369, 37.405356631)
            Line((-CONG_9_R * 0.268916679953, CONG_9_R * 0.205642167023), (0, 0))
            Line((0, 0), (CONG_9_R * 0.338533427618, 0))
        make_face()
    cong_9_piece_5 = extrude(amount=10, mode=Mode.PRIVATE)
    cong_9_piece_5 = split(cong_9_piece_5, bisect_by=Plane(origin=(23.815811659, 0.117652919, -13.961018177), z_dir=(-0.09345386270338202, 0.9912279006826004, 0.09345386270338202)), keep=Keep.TOP, mode=Mode.PRIVATE)
    cong_9_piece_5 = split(cong_9_piece_5, bisect_by=Plane(origin=(23.815811659, 9.882347081, -13.961018177), z_dir=(-0.09345386270338202, -0.9912279006826004, 0.09345386270338202)), keep=Keep.TOP, mode=Mode.PRIVATE)
    add(cong_9_piece_5)
    with BuildSketch(Plane(origin=(21.8, 0, 14.728932188), x_dir=(0, 0, -1), z_dir=(0, 1, 0))) as cong_9_piece_6_section:
        with BuildLine():
            CenterArc((CONG_9_R * 0.338533427618, -CONG_9_R), CONG_9_R, 90, 37.405356631)
            Line((-CONG_9_R * 0.268916679952, -CONG_9_R * 0.205642167022), (0, 0))
            Line((0, 0), (CONG_9_R * 0.338533427618, 0))
        make_face()
    cong_9_piece_6 = extrude(amount=10, mode=Mode.PRIVATE)
    cong_9_piece_6 = split(cong_9_piece_6, bisect_by=Plane(origin=(23.815811659, 0.117652919, 13.961018177), z_dir=(-0.09345386270338202, 0.9912279006826004, -0.09345386270338202)), keep=Keep.TOP, mode=Mode.PRIVATE)
    cong_9_piece_6 = split(cong_9_piece_6, bisect_by=Plane(origin=(23.815811659, 9.882347081, 13.961018177), z_dir=(-0.09345386270338202, -0.9912279006826004, -0.09345386270338202)), keep=Keep.TOP, mode=Mode.PRIVATE)
    add(cong_9_piece_6)
    with BuildSketch(Plane(origin=(14.728932188, 0, 21.8), x_dir=(-1, 0, 0), z_dir=(0, 1, 0))) as cong_9_piece_7_section:
        with BuildLine():
            CenterArc((CONG_9_R * 0.338533427618, CONG_9_R), CONG_9_R, 232.594643369, 37.405356631)
            Line((-CONG_9_R * 0.268916679953, CONG_9_R * 0.205642167023), (0, 0))
            Line((0, 0), (CONG_9_R * 0.338533427618, 0))
        make_face()
    cong_9_piece_7 = extrude(amount=10, mode=Mode.PRIVATE)
    cong_9_piece_7 = split(cong_9_piece_7, bisect_by=Plane(origin=(13.961018177, 0.117652919, 23.815811659), z_dir=(-0.09345386270338202, 0.9912279006826004, -0.09345386270338202)), keep=Keep.TOP, mode=Mode.PRIVATE)
    cong_9_piece_7 = split(cong_9_piece_7, bisect_by=Plane(origin=(13.961018177, 9.882347081, 23.815811659), z_dir=(-0.09345386270338202, -0.9912279006826004, -0.09345386270338202)), keep=Keep.TOP, mode=Mode.PRIVATE)
    add(cong_9_piece_7)
    with BuildSketch(Plane(origin=(-14.728932188, 0, 21.8), x_dir=(1, 0, 0), z_dir=(0, 1, 0))) as cong_9_piece_8_section:
        with BuildLine():
            CenterArc((CONG_9_R * 0.338533427618, -CONG_9_R), CONG_9_R, 90, 37.405356631)
            Line((-CONG_9_R * 0.268916679953, -CONG_9_R * 0.205642167023), (0, 0))
            Line((0, 0), (CONG_9_R * 0.338533427618, 0))
        make_face()
    cong_9_piece_8 = extrude(amount=10, mode=Mode.PRIVATE)
    cong_9_piece_8 = split(cong_9_piece_8, bisect_by=Plane(origin=(-13.961018177, 0.117652919, 23.815811659), z_dir=(0.09345386270338202, 0.9912279006826004, -0.09345386270338202)), keep=Keep.TOP, mode=Mode.PRIVATE)
    cong_9_piece_8 = split(cong_9_piece_8, bisect_by=Plane(origin=(-13.961018177, 9.882347081, 23.815811659), z_dir=(0.09345386270338202, -0.9912279006826004, -0.09345386270338202)), keep=Keep.TOP, mode=Mode.PRIVATE)
    add(cong_9_piece_8)

    # Congé10
    cong_10_edges = [part.edges().sort_by_distance(p)[0] for p in [
        (-16.8, 4.5, 4.3),
    ]]
    fillet(cong_10_edges, radius=CONG_10_R)


solid = part.part
